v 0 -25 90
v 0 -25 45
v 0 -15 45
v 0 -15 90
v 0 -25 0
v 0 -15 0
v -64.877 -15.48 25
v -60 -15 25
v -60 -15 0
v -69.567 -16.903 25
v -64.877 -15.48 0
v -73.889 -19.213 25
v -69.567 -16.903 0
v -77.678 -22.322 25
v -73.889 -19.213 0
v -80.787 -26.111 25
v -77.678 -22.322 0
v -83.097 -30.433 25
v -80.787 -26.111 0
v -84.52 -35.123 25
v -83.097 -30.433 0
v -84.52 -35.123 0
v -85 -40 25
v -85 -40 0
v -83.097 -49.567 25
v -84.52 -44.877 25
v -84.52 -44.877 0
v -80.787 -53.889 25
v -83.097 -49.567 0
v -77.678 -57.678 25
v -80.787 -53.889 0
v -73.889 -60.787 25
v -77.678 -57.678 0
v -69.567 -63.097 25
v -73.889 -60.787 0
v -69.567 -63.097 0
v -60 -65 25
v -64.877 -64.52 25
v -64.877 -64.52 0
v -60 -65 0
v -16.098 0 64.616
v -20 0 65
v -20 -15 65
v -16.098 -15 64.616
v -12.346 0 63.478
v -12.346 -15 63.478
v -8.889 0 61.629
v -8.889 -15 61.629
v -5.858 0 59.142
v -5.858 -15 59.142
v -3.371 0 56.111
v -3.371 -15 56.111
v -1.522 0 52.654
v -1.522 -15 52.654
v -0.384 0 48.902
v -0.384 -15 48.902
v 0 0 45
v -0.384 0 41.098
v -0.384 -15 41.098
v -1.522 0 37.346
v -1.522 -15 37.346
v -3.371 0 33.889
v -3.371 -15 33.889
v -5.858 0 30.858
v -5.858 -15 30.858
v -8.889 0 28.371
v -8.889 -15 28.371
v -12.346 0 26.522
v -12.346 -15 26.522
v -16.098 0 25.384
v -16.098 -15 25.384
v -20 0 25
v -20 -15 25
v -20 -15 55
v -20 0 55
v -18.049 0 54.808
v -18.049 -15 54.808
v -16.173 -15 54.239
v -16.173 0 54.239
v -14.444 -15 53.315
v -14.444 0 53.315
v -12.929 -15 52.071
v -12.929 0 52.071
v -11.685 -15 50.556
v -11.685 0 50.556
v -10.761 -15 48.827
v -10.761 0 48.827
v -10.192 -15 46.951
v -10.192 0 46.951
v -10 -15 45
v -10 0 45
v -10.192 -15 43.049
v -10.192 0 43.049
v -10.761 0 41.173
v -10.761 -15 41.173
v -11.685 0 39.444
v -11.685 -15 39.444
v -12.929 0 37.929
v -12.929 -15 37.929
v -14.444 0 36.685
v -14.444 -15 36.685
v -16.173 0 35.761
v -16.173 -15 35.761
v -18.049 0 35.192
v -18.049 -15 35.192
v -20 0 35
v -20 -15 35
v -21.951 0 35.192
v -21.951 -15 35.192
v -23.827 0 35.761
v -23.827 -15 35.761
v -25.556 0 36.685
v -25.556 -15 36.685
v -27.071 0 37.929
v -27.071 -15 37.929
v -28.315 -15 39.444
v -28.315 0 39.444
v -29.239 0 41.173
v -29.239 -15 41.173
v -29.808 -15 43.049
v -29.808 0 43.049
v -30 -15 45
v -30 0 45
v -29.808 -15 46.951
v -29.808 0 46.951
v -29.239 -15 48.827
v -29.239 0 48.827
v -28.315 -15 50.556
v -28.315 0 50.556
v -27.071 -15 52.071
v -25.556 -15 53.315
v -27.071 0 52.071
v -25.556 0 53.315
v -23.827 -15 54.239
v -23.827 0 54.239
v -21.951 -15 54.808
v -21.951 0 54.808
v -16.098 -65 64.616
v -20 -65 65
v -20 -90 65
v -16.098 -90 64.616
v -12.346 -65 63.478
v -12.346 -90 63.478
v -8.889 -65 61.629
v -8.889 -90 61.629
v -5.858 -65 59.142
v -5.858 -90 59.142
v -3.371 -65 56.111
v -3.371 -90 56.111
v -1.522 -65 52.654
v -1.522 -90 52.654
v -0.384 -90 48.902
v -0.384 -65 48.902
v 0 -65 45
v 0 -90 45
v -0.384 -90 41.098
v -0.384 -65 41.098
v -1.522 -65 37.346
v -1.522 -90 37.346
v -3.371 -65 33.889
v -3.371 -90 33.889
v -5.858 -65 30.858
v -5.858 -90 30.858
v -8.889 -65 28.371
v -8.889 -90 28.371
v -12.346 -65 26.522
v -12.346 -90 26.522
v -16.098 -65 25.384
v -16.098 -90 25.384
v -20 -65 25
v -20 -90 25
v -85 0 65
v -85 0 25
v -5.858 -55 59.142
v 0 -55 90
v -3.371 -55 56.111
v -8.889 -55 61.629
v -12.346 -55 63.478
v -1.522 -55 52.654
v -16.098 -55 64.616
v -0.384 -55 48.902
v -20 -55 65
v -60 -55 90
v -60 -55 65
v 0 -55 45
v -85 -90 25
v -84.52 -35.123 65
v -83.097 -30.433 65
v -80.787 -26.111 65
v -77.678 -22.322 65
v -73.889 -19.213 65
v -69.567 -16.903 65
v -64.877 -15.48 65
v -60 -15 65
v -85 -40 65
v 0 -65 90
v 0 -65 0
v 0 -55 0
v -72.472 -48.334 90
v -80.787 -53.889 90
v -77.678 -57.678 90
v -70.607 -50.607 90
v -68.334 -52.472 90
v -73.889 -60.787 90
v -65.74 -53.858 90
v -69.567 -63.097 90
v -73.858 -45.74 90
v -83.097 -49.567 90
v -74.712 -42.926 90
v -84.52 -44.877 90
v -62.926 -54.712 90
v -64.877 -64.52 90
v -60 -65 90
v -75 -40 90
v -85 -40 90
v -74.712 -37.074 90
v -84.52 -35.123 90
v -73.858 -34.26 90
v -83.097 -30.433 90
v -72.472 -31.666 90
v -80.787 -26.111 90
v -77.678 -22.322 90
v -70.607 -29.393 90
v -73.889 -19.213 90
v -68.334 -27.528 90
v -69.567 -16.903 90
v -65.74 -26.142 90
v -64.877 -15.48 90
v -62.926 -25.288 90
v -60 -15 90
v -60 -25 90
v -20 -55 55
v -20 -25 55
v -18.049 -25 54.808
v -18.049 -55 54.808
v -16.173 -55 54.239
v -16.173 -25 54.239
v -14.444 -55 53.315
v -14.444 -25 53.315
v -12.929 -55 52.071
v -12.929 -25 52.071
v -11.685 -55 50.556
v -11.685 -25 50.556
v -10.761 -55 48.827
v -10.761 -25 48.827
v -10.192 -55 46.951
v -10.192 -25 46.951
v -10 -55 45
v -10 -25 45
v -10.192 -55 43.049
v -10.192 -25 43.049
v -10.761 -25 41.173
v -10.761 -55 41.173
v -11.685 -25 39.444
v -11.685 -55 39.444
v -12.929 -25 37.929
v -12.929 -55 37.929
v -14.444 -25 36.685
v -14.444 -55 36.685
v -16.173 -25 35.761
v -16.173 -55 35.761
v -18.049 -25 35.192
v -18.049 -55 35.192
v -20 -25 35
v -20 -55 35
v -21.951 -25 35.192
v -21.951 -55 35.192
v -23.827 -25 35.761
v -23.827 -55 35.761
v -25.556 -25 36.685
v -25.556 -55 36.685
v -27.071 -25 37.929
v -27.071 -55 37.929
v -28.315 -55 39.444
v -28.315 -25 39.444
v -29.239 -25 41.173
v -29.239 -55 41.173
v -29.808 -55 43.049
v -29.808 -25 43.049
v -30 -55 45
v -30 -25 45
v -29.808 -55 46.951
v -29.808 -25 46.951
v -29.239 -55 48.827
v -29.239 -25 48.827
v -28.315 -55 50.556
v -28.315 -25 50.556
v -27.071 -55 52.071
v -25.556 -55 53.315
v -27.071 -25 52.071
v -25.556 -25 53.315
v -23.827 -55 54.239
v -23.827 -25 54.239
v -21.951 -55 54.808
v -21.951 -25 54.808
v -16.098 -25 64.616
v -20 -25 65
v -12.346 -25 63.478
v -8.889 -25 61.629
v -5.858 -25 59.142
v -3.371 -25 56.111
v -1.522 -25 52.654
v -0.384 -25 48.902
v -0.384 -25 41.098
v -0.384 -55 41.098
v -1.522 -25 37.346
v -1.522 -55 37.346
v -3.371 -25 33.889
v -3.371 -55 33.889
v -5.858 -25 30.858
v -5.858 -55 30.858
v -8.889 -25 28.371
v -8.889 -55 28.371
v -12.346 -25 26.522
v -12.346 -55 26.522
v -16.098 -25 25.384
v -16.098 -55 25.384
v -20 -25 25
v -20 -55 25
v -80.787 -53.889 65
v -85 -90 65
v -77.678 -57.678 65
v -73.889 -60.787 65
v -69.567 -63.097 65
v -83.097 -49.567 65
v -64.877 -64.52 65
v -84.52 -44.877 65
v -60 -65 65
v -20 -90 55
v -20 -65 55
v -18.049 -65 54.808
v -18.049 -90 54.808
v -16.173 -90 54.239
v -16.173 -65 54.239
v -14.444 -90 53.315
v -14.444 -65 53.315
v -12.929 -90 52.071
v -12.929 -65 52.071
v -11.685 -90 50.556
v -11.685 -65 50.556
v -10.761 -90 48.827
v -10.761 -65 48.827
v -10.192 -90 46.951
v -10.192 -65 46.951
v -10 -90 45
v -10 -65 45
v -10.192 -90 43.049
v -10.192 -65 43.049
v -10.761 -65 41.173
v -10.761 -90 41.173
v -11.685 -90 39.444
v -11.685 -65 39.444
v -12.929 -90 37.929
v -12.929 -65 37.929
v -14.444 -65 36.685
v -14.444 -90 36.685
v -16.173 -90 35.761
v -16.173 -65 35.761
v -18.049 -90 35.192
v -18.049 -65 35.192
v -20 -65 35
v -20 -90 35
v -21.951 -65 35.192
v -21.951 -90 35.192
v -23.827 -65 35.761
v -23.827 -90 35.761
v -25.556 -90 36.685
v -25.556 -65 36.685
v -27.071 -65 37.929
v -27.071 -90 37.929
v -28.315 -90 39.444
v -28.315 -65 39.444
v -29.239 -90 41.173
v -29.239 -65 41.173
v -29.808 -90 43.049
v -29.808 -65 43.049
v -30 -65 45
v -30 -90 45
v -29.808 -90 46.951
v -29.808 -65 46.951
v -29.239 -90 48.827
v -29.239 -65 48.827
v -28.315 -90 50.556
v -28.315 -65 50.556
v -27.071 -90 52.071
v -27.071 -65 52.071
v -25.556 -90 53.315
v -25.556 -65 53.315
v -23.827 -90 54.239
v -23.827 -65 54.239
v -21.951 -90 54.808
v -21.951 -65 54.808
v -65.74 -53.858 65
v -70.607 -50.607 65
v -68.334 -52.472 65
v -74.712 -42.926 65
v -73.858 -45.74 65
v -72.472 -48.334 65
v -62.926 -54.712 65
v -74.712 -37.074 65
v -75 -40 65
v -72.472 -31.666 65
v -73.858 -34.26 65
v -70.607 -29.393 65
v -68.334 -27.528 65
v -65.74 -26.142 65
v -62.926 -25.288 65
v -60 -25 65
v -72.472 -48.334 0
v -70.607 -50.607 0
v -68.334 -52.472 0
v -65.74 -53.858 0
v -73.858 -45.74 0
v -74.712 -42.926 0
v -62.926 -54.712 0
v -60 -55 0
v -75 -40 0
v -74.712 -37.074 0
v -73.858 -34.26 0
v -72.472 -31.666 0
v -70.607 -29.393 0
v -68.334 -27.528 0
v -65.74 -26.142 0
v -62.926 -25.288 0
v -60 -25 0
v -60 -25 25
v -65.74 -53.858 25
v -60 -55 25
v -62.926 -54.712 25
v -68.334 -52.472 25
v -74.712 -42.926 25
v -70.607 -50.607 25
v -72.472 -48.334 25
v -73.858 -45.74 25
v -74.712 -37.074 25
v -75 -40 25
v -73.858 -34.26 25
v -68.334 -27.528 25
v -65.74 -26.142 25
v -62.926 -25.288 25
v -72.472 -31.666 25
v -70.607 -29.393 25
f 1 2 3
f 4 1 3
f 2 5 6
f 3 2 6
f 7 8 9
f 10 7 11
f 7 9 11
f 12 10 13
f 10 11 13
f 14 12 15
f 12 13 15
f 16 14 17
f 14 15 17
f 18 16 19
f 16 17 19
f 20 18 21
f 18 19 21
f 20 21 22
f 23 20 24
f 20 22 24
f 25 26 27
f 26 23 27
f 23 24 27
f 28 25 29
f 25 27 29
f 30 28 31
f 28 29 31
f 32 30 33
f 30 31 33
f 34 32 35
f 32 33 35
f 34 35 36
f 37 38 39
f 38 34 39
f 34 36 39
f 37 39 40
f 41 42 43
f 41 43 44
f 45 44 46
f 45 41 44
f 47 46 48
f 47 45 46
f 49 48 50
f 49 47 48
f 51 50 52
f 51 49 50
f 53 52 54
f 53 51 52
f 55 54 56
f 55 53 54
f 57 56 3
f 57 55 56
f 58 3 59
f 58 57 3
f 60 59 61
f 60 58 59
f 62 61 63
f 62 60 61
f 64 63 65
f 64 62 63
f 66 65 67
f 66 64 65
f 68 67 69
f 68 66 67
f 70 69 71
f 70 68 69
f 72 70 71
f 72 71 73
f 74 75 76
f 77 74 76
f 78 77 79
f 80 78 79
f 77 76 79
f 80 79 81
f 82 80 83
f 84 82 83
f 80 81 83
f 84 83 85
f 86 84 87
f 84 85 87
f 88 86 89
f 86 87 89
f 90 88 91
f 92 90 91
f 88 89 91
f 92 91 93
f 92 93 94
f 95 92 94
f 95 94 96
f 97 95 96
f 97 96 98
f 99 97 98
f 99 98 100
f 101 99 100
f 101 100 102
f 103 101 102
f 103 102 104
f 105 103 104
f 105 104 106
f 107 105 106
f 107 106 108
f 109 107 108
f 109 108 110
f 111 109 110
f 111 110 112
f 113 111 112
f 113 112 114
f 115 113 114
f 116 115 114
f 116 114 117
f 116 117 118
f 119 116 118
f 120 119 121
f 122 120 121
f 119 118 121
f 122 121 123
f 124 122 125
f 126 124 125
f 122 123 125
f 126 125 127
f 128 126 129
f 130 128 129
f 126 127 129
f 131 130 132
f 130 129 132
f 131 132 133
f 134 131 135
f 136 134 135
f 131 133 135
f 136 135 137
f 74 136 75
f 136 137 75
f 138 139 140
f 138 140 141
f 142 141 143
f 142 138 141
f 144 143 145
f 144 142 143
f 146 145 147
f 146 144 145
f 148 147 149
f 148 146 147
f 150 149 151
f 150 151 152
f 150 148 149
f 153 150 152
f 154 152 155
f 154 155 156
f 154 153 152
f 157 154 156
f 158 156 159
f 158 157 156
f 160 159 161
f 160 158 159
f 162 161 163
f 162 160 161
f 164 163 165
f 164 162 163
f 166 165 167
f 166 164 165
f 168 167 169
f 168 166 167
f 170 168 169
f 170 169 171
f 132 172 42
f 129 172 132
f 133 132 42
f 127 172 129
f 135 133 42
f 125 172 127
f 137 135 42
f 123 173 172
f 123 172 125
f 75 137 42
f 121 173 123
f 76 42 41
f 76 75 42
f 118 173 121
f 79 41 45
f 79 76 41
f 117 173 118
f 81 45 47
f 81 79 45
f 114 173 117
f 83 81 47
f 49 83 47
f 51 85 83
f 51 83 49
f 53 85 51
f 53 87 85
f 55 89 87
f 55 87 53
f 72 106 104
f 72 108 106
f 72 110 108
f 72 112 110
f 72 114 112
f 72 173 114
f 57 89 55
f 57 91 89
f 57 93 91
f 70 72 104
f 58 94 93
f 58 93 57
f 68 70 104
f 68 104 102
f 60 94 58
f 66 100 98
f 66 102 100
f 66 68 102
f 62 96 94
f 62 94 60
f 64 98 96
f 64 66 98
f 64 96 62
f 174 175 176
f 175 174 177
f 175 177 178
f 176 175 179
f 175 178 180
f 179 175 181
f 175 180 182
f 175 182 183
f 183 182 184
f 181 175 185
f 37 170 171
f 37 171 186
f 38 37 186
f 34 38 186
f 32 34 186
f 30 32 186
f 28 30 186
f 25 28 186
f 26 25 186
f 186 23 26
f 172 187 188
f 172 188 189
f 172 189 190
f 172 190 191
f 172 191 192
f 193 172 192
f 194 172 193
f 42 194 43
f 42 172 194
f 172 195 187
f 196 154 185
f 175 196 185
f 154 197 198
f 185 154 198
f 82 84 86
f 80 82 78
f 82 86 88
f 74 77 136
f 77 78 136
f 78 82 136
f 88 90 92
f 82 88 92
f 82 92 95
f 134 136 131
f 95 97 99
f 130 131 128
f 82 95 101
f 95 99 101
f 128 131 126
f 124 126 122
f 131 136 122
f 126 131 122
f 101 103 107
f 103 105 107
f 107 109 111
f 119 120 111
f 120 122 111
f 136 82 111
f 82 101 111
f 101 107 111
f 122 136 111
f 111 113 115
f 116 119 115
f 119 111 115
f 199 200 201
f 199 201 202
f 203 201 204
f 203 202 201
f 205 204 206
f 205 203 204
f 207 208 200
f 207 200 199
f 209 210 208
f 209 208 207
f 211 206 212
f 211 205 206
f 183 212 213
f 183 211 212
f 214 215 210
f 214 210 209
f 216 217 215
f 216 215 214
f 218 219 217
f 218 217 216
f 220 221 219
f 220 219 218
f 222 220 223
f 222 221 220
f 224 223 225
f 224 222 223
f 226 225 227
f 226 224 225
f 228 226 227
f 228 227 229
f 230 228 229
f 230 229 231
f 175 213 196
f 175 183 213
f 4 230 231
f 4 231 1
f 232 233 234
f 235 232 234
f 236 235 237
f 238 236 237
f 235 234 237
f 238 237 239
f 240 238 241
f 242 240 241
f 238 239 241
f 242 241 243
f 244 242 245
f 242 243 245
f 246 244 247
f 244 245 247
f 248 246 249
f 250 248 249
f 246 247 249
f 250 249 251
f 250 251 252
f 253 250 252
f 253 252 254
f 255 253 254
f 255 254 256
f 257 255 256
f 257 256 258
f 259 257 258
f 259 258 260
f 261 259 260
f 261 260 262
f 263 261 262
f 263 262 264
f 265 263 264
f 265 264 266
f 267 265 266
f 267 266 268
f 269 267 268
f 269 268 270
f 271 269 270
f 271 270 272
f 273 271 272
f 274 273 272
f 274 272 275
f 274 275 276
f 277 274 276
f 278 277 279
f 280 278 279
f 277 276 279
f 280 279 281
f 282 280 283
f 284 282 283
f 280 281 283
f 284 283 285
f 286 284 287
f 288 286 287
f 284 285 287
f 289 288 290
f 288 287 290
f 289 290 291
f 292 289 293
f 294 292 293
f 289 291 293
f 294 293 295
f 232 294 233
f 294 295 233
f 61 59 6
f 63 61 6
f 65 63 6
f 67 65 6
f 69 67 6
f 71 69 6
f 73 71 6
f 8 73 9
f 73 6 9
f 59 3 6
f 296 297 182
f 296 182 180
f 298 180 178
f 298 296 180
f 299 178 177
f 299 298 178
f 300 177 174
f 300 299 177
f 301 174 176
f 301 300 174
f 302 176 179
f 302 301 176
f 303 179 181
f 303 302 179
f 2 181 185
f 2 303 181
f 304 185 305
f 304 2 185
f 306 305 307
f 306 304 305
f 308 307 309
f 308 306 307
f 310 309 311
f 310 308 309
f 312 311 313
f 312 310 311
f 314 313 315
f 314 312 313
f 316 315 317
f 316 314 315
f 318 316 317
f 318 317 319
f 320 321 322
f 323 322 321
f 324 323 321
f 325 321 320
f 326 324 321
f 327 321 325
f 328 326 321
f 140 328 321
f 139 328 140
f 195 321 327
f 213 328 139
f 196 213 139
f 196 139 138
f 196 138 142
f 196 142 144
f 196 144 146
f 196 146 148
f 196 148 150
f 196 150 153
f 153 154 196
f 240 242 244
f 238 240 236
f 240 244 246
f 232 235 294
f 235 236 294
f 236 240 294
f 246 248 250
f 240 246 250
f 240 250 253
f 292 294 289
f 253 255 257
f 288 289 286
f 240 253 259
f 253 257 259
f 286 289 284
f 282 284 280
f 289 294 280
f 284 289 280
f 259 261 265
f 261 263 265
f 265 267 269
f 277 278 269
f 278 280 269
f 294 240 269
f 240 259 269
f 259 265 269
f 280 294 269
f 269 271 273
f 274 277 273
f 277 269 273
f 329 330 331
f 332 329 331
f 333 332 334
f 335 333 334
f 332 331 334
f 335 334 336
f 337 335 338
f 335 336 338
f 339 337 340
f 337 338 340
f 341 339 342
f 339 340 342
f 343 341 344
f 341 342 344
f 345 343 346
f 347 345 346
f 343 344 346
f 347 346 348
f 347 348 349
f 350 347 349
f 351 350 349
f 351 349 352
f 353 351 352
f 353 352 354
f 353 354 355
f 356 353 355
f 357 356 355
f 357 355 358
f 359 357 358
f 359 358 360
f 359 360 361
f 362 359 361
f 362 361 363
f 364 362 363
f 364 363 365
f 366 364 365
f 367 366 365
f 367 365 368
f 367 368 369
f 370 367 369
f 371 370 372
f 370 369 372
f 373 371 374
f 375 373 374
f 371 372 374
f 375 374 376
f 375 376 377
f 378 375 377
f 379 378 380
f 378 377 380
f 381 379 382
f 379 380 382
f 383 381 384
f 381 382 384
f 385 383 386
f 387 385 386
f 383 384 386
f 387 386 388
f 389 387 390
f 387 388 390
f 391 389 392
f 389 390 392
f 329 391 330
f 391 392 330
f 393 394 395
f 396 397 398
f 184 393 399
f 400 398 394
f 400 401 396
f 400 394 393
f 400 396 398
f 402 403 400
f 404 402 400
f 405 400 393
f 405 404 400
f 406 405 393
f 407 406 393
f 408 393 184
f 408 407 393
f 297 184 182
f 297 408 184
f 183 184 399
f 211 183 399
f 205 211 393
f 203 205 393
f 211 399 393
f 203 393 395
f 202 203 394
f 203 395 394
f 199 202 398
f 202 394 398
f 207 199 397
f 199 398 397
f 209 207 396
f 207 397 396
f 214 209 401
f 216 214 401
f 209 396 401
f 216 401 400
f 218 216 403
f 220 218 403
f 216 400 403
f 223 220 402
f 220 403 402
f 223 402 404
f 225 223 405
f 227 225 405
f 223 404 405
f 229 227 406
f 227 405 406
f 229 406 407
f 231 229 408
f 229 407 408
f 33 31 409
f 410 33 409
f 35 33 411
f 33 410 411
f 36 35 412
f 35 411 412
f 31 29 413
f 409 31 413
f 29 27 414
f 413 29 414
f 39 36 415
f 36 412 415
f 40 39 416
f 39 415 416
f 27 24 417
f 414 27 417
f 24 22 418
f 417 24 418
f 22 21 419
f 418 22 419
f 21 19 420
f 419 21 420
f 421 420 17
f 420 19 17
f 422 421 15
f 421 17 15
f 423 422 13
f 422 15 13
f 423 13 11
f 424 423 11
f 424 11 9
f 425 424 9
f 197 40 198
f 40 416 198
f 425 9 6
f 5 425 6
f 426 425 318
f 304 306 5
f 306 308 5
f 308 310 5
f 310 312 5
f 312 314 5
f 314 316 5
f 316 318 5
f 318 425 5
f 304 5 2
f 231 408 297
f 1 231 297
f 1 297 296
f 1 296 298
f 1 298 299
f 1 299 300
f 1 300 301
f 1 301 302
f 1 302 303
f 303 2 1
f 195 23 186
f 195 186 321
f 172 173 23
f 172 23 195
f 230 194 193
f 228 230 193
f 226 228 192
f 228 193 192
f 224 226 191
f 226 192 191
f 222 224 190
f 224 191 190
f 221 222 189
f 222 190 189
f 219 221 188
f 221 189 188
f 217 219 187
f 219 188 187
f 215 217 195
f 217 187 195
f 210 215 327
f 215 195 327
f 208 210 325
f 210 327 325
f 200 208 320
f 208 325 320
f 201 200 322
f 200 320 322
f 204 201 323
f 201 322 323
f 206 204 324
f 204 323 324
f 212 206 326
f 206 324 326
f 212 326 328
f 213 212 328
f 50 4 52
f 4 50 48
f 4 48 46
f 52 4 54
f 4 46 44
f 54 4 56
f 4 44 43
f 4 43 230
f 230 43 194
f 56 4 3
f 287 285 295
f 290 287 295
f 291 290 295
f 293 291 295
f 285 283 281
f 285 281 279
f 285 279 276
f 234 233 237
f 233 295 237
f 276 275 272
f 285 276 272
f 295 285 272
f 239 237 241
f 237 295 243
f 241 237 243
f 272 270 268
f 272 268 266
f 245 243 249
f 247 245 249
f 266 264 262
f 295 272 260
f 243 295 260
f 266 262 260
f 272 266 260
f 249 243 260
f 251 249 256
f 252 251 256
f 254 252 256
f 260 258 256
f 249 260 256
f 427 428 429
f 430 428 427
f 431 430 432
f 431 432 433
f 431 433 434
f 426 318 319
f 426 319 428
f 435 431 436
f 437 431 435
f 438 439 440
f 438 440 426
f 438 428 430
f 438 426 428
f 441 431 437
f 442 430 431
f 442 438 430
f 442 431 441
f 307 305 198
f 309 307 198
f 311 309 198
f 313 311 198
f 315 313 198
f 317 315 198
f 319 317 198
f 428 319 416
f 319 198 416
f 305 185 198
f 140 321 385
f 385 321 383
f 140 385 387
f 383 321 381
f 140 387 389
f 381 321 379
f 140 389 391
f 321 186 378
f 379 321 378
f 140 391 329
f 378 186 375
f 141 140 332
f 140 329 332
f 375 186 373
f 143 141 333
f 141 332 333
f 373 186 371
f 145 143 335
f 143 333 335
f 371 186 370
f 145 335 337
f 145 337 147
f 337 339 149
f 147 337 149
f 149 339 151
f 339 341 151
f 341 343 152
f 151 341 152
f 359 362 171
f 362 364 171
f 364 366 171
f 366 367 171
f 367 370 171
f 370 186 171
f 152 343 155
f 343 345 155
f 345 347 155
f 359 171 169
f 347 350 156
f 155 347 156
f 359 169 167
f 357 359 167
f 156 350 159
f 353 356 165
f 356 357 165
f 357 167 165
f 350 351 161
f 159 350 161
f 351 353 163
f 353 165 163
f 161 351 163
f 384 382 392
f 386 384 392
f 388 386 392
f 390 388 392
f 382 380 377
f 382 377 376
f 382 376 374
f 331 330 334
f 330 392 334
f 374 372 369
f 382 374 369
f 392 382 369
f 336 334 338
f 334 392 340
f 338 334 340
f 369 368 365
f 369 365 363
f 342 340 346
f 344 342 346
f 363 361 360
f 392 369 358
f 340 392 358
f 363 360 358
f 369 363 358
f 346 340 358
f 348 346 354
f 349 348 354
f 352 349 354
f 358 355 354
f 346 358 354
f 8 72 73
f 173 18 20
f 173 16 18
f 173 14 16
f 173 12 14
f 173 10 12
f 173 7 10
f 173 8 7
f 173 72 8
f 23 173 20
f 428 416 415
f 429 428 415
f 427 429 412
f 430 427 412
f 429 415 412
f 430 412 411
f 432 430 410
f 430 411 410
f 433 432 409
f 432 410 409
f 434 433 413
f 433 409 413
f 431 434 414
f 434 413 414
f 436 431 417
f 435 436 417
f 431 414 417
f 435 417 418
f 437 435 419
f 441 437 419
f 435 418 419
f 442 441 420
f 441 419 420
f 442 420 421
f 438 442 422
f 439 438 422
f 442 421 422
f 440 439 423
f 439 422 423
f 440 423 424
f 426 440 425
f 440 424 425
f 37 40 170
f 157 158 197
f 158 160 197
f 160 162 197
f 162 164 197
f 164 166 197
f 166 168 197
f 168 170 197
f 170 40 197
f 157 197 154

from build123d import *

# Parameters (mm, degrees)
EXTRUDE_THIN1_DEPTH = 90
SKETCH2_R           = 10
BOSS_EXTRUDE1_DEPTH = 90


with BuildPart() as part:
    # Sketch1 → Extrude-Thin1 (new body)
    with BuildSketch(Plane.XY):
        with BuildLine():
            Line((0, -15), (-60, -15))
            ThreePointArc((-60, -15), (-85, -40), (-60, -65))
            Line((-60, -65), (0, -65))
            Line((0, -65), (0, -55))
            Line((0, -55), (-60, -55))
            ThreePointArc((-60, -55), (-75, -40), (-60, -25))
            Line((-60, -25), (0, -25))
            Line((0, -25), (0, -15))
        make_face()
    extrude(amount=EXTRUDE_THIN1_DEPTH)


with BuildPart() as body_2:
    # Sketch2 → Boss-Extrude1 (new body)
    with BuildSketch(Plane(origin=(0, 0, 0), x_dir=(1, 0, 0), z_dir=(0, 1, 0))):
        with BuildLine():
            Line((-85, -25), (-85, -65))
            Line((-85, -65), (-20, -65))
            ThreePointArc((-20, -65), (0, -45), (-20, -25))
            Line((-20, -25), (-85, -25))
        make_face()
        with Locations((-20, -45)):
            Circle(SKETCH2_R, mode=Mode.SUBTRACT)
    extrude(amount=-BOSS_EXTRUDE1_DEPTH)


with BuildPart() as part_1:
    add(part.part)

    # official_combine_multi_inter: union body 2
    add(body_2.part)


solid = part_1.part
